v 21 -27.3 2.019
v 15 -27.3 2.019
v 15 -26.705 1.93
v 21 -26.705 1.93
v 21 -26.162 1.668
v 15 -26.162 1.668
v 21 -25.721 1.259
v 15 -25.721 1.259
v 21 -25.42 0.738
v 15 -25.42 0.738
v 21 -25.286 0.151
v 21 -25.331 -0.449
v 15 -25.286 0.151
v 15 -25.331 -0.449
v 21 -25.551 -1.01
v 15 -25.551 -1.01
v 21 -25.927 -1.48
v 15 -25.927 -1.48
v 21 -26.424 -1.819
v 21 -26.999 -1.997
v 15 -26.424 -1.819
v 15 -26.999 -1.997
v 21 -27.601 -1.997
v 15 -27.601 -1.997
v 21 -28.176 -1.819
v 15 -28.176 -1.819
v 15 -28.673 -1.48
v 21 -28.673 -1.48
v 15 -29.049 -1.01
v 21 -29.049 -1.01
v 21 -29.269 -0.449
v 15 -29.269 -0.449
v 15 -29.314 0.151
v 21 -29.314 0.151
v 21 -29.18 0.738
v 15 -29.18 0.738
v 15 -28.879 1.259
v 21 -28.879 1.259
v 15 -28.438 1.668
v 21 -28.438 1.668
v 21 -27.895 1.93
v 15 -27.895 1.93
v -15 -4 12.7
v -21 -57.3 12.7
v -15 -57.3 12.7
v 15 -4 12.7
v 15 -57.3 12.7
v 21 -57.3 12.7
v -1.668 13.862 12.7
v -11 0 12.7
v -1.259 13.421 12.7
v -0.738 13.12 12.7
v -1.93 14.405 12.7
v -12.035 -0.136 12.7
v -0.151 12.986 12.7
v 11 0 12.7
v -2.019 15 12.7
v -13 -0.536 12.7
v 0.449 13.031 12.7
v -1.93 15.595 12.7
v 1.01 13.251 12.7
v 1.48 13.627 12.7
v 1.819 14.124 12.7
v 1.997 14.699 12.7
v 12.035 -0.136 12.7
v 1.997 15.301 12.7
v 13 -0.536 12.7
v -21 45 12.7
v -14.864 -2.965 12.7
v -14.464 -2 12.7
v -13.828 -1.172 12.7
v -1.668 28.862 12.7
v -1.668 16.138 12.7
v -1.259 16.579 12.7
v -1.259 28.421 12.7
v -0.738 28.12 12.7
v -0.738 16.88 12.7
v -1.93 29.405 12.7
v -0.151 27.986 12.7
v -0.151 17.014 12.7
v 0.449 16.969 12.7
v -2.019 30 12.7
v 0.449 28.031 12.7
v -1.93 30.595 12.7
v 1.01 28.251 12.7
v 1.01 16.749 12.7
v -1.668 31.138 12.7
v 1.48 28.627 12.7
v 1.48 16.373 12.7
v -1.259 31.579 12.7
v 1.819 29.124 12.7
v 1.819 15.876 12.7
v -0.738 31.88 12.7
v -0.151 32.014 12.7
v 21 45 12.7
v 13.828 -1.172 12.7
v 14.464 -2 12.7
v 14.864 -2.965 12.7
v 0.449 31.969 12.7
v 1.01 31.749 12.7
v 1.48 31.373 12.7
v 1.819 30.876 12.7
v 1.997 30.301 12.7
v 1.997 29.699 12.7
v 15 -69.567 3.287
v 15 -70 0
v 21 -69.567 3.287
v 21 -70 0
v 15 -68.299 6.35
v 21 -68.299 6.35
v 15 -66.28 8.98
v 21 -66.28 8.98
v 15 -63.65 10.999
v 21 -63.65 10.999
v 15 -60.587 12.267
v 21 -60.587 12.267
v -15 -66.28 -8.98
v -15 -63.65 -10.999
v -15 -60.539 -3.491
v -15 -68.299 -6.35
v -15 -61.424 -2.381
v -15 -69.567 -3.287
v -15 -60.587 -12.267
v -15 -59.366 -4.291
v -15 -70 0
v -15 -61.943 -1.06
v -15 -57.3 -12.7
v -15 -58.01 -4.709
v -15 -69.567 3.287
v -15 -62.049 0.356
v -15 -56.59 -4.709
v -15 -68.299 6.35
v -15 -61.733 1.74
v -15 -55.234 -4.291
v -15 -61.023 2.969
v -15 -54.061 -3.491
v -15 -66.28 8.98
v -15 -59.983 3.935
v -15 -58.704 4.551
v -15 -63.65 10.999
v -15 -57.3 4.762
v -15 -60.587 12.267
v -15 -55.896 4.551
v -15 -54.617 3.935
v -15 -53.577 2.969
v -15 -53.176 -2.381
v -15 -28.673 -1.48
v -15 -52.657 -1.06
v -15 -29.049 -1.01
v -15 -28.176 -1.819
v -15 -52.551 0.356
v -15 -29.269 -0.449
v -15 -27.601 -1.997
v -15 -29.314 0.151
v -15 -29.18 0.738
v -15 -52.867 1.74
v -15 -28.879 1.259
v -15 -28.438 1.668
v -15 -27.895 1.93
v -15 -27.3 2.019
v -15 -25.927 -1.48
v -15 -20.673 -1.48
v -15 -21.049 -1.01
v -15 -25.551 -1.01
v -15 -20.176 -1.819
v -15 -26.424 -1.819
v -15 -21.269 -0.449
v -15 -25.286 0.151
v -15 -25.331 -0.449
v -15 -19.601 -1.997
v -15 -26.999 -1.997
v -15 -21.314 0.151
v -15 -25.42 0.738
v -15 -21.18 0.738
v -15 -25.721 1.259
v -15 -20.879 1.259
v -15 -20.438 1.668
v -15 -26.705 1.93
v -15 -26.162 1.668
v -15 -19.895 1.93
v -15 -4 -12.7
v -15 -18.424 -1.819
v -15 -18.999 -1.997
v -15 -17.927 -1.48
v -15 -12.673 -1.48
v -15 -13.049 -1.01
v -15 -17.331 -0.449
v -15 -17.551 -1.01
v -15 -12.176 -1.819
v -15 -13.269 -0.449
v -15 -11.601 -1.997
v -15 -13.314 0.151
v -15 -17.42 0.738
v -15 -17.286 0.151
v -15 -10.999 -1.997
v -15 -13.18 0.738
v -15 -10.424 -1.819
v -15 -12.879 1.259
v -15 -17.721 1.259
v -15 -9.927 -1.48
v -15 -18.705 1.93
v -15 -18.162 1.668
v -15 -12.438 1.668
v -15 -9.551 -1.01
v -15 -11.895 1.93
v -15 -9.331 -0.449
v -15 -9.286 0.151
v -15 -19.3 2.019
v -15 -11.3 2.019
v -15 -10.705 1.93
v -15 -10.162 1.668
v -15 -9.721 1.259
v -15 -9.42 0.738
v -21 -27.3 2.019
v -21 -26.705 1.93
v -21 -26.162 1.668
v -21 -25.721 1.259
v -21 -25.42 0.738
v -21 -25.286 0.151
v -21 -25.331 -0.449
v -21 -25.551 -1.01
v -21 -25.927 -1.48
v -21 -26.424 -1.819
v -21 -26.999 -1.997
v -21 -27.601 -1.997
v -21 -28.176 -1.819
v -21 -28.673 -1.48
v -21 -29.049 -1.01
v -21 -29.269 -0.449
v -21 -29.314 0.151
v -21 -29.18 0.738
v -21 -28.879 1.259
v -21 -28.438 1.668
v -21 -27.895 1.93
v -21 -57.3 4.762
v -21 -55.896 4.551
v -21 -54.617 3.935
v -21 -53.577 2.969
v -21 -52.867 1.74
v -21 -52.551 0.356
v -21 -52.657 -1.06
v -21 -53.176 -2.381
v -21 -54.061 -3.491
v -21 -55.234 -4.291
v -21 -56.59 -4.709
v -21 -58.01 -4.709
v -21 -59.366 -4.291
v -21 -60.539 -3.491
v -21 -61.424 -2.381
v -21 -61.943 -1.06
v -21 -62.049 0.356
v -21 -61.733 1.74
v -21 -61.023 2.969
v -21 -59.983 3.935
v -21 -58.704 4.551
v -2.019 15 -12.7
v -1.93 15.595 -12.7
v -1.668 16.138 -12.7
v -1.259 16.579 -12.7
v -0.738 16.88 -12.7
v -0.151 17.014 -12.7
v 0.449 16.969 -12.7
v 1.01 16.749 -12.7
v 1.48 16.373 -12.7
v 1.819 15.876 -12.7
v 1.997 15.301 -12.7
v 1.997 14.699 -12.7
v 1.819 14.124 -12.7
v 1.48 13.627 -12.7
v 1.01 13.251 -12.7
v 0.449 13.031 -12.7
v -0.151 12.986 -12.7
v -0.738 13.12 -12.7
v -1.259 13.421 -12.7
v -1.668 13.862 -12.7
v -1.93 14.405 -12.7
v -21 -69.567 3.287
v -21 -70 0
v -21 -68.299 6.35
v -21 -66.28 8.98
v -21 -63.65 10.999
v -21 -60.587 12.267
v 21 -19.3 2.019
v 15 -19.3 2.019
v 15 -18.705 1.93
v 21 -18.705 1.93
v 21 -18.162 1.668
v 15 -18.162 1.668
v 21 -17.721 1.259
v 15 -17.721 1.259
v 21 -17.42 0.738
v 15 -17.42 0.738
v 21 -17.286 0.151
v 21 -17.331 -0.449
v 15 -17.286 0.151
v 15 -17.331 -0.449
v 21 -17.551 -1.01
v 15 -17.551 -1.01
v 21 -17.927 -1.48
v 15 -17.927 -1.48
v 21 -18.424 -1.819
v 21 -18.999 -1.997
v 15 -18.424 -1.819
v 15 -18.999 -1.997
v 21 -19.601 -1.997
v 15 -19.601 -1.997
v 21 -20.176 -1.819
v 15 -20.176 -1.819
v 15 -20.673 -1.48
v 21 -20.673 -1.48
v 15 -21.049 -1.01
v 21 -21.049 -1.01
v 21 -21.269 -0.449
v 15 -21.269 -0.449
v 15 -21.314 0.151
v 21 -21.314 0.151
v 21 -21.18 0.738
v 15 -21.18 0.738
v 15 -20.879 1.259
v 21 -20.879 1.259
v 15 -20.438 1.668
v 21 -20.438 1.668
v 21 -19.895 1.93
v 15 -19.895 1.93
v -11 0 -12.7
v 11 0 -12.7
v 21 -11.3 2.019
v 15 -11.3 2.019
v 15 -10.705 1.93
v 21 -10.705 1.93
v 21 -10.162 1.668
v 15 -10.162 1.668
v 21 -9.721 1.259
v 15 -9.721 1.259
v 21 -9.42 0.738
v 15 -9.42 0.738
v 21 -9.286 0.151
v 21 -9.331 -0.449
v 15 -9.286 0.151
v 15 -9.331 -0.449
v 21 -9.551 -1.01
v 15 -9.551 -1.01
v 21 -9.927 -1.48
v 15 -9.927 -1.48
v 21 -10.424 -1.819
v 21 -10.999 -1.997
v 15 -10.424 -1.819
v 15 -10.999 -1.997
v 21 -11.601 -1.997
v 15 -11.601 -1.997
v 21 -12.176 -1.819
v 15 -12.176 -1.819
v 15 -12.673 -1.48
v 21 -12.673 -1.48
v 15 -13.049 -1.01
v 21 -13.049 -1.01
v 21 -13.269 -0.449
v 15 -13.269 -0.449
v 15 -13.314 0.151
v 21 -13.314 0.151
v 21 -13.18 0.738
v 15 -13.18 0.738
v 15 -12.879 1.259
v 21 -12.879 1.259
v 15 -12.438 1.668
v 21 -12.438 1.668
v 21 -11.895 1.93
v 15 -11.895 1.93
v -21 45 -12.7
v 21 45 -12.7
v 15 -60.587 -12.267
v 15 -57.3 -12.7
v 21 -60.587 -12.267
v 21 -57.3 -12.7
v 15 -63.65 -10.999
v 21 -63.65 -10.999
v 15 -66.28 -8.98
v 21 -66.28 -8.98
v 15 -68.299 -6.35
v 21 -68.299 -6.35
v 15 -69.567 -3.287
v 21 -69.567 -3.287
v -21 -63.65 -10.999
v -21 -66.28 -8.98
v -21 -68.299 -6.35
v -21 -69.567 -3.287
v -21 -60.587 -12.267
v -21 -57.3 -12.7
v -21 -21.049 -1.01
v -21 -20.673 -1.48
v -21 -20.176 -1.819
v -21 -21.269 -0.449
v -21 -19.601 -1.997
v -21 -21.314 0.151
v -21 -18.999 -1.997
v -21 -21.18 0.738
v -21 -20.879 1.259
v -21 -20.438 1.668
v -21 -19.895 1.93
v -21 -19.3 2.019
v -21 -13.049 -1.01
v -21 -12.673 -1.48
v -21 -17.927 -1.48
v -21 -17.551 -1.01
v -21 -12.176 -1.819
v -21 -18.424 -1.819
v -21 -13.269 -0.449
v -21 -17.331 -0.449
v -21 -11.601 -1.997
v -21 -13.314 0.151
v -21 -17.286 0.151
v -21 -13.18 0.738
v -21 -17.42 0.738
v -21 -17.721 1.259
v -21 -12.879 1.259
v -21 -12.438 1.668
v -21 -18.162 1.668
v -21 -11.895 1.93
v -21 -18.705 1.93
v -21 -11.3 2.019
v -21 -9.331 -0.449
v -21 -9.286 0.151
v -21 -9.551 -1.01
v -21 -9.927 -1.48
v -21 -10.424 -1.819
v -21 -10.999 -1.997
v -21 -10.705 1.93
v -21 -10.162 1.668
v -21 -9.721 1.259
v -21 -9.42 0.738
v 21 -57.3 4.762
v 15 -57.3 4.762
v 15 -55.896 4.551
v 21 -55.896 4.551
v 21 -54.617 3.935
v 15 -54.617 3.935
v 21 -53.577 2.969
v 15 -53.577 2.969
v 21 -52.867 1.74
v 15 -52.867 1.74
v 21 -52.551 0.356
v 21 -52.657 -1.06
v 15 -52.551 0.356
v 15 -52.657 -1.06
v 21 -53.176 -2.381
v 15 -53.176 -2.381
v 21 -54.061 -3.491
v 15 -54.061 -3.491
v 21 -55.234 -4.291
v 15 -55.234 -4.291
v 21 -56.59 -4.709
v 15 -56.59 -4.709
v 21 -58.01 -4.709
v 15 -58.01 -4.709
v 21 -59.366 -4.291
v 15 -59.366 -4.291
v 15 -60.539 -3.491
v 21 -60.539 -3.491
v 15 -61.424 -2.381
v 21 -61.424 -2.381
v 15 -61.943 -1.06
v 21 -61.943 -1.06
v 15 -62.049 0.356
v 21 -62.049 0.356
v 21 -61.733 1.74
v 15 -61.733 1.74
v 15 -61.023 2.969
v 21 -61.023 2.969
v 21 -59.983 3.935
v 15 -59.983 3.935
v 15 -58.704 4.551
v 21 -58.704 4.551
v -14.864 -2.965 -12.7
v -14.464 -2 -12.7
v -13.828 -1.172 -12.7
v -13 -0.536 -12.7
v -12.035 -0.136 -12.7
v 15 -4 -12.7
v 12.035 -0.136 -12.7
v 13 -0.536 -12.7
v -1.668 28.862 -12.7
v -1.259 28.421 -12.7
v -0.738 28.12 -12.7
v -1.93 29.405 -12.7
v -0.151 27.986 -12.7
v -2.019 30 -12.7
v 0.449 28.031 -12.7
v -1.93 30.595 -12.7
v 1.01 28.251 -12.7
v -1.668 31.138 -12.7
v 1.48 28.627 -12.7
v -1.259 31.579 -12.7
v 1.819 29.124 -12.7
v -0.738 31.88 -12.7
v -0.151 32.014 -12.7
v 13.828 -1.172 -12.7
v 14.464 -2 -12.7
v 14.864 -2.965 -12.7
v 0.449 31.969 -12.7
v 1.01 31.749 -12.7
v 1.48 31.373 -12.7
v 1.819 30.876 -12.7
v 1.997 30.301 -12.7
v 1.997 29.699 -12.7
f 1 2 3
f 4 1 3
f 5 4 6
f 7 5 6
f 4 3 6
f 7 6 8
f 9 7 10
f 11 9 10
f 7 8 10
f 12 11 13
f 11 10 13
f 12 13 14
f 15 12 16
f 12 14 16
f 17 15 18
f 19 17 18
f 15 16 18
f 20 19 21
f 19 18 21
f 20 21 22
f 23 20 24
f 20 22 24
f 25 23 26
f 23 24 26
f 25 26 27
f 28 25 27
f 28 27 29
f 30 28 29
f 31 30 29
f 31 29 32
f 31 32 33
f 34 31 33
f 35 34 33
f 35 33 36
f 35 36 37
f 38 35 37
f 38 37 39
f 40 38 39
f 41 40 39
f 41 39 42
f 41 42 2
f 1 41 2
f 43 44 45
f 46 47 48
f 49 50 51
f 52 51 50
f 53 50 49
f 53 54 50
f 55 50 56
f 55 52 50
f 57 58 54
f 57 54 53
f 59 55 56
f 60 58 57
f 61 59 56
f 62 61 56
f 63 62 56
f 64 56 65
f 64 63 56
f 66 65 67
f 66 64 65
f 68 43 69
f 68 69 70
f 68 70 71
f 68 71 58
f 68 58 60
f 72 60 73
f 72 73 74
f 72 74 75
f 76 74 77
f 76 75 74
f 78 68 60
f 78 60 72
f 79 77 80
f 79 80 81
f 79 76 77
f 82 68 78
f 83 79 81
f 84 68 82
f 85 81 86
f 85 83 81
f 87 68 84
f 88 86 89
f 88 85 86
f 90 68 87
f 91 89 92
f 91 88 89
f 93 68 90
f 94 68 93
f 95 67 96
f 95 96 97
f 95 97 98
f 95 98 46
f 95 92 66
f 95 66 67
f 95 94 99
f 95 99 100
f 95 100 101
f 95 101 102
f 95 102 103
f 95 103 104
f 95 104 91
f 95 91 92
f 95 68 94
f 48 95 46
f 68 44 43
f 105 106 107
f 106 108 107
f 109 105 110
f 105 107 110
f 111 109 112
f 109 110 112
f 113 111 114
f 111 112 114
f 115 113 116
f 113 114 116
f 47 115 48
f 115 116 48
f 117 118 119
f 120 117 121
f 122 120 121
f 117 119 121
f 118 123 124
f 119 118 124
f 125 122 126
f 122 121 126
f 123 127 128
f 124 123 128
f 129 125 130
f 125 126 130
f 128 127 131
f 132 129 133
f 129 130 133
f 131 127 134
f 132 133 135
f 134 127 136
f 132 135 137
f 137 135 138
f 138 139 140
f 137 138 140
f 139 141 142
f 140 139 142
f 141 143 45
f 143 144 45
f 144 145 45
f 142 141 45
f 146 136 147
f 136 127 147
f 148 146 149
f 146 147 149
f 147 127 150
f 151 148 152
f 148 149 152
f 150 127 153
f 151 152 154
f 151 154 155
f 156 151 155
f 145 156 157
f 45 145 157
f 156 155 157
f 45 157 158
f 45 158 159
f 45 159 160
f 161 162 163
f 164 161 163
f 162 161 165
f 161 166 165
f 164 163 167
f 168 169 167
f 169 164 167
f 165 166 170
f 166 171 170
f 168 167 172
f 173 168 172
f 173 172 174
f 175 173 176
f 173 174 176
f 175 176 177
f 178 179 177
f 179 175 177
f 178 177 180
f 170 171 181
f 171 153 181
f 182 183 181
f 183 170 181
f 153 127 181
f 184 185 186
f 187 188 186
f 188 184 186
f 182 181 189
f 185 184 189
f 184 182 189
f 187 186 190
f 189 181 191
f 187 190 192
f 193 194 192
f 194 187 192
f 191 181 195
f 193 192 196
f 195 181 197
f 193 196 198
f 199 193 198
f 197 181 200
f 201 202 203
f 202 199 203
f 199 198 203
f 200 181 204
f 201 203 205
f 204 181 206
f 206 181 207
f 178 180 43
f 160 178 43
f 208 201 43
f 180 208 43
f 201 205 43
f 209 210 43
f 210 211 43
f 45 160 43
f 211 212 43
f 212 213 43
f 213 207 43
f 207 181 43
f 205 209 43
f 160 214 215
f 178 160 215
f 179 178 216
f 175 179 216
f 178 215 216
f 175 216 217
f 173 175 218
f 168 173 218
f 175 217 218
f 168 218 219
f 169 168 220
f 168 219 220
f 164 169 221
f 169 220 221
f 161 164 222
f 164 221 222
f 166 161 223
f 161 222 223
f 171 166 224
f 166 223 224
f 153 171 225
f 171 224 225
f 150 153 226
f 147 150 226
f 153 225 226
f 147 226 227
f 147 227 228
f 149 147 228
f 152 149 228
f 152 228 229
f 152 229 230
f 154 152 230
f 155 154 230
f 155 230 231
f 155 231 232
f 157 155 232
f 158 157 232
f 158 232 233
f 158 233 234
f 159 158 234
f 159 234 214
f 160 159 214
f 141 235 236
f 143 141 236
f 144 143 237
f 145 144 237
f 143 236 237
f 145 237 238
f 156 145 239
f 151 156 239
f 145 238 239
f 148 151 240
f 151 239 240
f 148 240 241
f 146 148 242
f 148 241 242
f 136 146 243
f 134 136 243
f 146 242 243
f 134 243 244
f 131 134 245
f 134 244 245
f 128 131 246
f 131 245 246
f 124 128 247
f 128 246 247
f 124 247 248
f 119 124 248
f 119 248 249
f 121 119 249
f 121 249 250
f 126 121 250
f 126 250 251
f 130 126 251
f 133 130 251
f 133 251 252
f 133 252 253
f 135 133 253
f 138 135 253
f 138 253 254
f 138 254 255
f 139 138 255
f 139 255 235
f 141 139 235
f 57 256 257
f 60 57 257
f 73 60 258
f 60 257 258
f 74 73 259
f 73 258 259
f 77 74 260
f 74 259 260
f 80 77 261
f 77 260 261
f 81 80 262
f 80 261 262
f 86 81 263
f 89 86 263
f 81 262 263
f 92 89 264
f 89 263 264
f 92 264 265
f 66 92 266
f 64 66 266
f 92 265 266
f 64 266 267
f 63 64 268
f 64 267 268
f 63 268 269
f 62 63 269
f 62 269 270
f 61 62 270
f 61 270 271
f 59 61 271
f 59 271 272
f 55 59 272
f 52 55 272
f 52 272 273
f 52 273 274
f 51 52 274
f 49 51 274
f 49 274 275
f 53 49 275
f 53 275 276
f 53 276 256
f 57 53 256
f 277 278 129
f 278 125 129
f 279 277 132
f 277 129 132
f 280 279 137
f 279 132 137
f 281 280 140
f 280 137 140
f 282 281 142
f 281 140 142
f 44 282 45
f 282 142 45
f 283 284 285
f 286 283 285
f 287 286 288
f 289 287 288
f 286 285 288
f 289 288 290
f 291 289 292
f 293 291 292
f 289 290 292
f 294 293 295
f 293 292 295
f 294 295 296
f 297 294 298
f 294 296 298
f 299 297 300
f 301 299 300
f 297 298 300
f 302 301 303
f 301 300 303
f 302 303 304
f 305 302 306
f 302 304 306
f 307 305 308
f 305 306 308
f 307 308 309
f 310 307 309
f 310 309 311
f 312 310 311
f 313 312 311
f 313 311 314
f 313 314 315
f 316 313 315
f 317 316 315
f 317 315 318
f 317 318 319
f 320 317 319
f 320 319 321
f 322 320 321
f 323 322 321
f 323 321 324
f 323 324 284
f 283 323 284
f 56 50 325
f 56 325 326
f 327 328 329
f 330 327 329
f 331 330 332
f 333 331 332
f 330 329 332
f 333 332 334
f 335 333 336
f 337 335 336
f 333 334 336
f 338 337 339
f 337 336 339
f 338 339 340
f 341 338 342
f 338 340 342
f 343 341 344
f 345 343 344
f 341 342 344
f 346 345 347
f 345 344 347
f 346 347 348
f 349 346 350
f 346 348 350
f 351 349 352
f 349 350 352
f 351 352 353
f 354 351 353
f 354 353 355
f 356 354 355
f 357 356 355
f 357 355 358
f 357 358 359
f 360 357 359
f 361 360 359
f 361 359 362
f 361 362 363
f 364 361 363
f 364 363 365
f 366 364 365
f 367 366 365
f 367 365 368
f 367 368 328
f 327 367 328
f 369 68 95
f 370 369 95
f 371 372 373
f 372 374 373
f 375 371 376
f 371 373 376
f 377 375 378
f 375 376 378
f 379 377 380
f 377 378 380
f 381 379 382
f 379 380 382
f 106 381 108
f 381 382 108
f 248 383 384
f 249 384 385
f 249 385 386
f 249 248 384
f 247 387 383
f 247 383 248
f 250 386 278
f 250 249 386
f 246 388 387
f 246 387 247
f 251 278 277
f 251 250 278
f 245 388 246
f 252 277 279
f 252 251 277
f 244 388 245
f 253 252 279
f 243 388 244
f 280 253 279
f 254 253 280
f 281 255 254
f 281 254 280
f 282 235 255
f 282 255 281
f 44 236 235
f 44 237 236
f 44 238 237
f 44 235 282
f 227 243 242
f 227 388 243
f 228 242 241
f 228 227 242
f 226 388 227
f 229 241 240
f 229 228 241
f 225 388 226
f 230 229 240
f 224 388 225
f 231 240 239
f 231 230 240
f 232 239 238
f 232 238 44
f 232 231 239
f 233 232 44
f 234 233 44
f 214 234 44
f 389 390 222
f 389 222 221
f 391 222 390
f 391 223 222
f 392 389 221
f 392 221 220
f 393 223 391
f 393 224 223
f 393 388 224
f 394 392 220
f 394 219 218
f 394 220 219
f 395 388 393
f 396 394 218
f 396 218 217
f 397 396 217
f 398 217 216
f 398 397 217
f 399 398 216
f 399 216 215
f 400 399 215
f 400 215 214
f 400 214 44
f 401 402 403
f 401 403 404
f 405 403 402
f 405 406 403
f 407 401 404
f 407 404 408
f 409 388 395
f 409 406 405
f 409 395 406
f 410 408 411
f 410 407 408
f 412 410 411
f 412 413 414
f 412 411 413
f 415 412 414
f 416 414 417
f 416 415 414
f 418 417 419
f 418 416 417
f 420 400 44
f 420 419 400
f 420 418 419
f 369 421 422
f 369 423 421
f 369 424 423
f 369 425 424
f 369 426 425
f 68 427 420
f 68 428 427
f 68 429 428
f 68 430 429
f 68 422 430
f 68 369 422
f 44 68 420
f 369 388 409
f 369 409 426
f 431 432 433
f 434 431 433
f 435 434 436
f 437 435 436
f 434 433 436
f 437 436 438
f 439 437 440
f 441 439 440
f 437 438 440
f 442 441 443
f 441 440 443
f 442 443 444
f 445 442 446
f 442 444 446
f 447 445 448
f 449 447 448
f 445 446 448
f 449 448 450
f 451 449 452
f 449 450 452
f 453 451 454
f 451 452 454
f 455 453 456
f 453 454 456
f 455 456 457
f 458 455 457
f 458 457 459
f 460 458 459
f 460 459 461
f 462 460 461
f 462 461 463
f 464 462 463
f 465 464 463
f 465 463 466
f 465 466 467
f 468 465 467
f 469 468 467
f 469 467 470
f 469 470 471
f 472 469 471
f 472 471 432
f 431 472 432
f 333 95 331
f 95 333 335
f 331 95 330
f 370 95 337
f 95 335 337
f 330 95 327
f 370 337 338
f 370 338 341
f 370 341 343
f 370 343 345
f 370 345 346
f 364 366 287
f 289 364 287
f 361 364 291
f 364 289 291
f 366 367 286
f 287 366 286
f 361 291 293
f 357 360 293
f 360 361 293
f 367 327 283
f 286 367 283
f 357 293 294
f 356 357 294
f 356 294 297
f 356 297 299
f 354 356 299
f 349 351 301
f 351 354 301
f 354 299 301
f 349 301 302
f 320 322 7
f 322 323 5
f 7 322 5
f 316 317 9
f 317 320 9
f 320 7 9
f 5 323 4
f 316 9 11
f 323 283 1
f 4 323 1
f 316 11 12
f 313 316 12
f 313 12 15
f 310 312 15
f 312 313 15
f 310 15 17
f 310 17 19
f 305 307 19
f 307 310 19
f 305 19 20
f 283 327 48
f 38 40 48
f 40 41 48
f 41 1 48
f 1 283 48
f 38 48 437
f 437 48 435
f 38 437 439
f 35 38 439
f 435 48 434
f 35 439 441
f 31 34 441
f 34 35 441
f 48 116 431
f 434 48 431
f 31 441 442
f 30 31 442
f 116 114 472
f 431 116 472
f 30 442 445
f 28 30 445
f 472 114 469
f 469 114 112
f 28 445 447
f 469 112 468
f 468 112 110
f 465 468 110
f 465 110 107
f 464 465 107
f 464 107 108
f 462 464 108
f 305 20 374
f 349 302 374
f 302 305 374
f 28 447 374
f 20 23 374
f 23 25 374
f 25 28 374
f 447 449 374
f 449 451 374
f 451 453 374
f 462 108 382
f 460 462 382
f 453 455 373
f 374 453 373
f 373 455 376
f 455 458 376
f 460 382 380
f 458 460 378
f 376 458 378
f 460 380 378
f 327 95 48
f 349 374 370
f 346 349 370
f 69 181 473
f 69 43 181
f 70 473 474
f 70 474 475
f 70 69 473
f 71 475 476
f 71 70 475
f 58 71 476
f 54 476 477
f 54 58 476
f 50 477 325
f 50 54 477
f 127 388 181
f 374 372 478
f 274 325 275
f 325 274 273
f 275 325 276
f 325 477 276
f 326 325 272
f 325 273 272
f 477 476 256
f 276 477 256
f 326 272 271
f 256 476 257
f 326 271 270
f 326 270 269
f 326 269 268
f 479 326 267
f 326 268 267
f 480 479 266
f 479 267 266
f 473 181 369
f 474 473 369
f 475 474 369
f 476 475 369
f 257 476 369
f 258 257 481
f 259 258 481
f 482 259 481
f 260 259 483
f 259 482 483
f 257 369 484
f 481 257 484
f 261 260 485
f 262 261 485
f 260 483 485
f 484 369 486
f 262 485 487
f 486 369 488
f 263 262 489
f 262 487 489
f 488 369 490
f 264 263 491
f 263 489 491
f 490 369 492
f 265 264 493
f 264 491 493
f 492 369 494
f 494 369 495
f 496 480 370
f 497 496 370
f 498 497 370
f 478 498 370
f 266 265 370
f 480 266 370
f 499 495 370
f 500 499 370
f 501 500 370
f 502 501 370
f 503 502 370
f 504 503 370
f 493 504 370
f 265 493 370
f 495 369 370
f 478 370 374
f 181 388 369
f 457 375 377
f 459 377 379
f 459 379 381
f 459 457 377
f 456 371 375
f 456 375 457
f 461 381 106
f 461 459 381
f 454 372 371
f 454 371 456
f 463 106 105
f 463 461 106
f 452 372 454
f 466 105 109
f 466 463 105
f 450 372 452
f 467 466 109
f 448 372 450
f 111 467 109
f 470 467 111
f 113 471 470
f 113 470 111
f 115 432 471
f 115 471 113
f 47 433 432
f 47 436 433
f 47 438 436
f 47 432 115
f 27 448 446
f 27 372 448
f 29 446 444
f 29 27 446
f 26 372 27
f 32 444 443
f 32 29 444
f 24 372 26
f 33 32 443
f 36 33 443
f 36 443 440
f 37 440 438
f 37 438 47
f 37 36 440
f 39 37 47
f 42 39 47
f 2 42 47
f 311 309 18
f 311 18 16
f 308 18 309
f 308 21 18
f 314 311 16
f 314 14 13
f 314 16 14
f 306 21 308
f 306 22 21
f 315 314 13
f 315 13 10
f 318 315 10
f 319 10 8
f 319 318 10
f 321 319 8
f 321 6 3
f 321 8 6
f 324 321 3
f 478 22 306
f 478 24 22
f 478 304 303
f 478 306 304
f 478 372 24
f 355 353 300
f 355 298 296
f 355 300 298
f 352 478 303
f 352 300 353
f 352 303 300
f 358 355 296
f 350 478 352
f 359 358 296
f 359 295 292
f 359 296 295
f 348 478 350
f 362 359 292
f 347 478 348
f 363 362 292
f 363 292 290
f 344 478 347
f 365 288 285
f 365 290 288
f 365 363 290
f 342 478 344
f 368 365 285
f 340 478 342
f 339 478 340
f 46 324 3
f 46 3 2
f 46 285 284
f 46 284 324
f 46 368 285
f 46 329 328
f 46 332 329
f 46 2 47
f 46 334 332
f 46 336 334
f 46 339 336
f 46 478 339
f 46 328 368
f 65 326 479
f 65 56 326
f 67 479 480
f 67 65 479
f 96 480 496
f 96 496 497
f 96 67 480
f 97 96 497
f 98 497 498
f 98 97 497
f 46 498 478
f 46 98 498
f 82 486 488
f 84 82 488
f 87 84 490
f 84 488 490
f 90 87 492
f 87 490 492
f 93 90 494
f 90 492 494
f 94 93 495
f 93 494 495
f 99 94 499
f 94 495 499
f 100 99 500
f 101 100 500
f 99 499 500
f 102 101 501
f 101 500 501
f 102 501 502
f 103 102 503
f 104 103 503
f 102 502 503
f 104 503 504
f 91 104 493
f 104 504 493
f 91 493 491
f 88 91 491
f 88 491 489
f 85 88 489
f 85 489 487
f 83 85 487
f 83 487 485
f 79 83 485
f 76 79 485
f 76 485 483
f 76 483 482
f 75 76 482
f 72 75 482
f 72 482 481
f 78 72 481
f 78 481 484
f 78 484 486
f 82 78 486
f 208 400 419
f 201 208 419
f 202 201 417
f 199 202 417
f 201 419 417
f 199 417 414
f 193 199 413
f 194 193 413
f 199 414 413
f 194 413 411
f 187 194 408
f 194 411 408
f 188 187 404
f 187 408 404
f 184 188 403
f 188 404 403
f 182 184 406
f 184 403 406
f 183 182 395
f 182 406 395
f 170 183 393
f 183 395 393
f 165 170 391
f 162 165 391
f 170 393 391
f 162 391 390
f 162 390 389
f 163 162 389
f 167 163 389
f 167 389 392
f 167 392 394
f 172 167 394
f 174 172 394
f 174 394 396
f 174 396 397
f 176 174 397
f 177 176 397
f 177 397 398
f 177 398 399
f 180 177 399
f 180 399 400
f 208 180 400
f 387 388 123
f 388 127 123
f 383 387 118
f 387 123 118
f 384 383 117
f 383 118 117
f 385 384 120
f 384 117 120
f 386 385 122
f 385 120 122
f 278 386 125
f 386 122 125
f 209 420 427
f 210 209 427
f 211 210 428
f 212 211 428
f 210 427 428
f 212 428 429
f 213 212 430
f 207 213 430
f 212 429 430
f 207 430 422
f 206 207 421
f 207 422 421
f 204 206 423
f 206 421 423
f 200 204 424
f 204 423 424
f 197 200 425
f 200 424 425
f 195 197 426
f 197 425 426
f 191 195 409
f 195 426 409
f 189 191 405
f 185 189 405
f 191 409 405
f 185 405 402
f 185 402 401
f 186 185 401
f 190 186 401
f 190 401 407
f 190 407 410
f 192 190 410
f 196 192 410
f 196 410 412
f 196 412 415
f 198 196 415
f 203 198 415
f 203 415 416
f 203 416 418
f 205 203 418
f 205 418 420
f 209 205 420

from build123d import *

# Parameters (mm, degrees)
SKETCH_1_W            = 42
SKETCH_1_H            = 25.4
EXTRUDE_1_DEPTH       = 70
SKETCH_5_W            = 6
SKETCH_5_H            = 25.4
EXTRUDE_5_DEPTH       = 70
SKETCH_6_R            = 4.7625
CUT_EXTRUDE_2_DEPTH   = 83.61531335
FILLET_6_R            = 4
HOLE_WIZARD_10_32_1_D = 4.0386
FILLET_7_R            = 12.7
SKETCH_9_W            = 42
SKETCH_9_H            = 25
CUT_EXTRUDE_3_DEPTH   = 78.370278531
HOLE_WIZARD_10_32_2_D = 4.0386


with BuildPart() as part:
    # 草圖1 → 填料-伸長1 (new body)
    with BuildSketch(Plane(origin=(0, 0, 0), x_dir=(1, 0, 0), z_dir=(0, 1, 0))):
        Rectangle(SKETCH_1_W, SKETCH_1_H)
    extrude(amount=EXTRUDE_1_DEPTH)

    # 草圖5 → 填料-伸長5 (add)
    with BuildSketch(Plane.XZ):
        with Locations((-18, 0)):
            Rectangle(SKETCH_5_W, SKETCH_5_H)
        with Locations((18, 0)):
            Rectangle(SKETCH_5_W, SKETCH_5_H)
    extrude(amount=EXTRUDE_5_DEPTH)

    # 草圖6 → 除料-伸長2 (cut, through all)
    with BuildSketch(Plane.ZY.offset(21)):
        with Locations((0, -57.3)):
            Circle(SKETCH_6_R)
    extrude(amount=-CUT_EXTRUDE_2_DEPTH, mode=Mode.SUBTRACT)

    # 圓角6
    fillet_6_edges = [part.edges().sort_by_distance(p)[0] for p in [
        (15, 0, 0),
        (-15, 0, 0),
    ]]
    fillet(fillet_6_edges, radius=FILLET_6_R)

    # #10-32 螺紋孔1 (through all)
    with Locations(Plane.XY.offset(12.7)):
        with Locations((0, 30), (0, 15)):
            Hole(HOLE_WIZARD_10_32_1_D / 2)

    # 圓角7
    fillet_7_edges = [part.edges().sort_by_distance(p)[0] for p in [
        (18, -70, 12.7),
        (18, -70, -12.7),
        (-18, -70, 12.7),
        (-18, -70, -12.7),
    ]]
    fillet(fillet_7_edges, radius=FILLET_7_R - 0.0001)  # a hair under: the kernel refuses the full size

    # 草圖9 → 除料-伸長3 (cut, through all)
    with BuildSketch(Plane.XY.offset(12.7)):
        with Locations((0, 57.5)):
            Rectangle(SKETCH_9_W, SKETCH_9_H)
    extrude(amount=-CUT_EXTRUDE_3_DEPTH, mode=Mode.SUBTRACT)

    # #10-32 螺紋孔2 (through all)
    with Locations(Plane(origin=(21, 0, 0), x_dir=(0, 0, -1), z_dir=(1, 0, 0))):
        with Locations((0, -11.3), (0, -19.3), (0, -27.3)):
            Hole(HOLE_WIZARD_10_32_2_D / 2)


solid = part.part
